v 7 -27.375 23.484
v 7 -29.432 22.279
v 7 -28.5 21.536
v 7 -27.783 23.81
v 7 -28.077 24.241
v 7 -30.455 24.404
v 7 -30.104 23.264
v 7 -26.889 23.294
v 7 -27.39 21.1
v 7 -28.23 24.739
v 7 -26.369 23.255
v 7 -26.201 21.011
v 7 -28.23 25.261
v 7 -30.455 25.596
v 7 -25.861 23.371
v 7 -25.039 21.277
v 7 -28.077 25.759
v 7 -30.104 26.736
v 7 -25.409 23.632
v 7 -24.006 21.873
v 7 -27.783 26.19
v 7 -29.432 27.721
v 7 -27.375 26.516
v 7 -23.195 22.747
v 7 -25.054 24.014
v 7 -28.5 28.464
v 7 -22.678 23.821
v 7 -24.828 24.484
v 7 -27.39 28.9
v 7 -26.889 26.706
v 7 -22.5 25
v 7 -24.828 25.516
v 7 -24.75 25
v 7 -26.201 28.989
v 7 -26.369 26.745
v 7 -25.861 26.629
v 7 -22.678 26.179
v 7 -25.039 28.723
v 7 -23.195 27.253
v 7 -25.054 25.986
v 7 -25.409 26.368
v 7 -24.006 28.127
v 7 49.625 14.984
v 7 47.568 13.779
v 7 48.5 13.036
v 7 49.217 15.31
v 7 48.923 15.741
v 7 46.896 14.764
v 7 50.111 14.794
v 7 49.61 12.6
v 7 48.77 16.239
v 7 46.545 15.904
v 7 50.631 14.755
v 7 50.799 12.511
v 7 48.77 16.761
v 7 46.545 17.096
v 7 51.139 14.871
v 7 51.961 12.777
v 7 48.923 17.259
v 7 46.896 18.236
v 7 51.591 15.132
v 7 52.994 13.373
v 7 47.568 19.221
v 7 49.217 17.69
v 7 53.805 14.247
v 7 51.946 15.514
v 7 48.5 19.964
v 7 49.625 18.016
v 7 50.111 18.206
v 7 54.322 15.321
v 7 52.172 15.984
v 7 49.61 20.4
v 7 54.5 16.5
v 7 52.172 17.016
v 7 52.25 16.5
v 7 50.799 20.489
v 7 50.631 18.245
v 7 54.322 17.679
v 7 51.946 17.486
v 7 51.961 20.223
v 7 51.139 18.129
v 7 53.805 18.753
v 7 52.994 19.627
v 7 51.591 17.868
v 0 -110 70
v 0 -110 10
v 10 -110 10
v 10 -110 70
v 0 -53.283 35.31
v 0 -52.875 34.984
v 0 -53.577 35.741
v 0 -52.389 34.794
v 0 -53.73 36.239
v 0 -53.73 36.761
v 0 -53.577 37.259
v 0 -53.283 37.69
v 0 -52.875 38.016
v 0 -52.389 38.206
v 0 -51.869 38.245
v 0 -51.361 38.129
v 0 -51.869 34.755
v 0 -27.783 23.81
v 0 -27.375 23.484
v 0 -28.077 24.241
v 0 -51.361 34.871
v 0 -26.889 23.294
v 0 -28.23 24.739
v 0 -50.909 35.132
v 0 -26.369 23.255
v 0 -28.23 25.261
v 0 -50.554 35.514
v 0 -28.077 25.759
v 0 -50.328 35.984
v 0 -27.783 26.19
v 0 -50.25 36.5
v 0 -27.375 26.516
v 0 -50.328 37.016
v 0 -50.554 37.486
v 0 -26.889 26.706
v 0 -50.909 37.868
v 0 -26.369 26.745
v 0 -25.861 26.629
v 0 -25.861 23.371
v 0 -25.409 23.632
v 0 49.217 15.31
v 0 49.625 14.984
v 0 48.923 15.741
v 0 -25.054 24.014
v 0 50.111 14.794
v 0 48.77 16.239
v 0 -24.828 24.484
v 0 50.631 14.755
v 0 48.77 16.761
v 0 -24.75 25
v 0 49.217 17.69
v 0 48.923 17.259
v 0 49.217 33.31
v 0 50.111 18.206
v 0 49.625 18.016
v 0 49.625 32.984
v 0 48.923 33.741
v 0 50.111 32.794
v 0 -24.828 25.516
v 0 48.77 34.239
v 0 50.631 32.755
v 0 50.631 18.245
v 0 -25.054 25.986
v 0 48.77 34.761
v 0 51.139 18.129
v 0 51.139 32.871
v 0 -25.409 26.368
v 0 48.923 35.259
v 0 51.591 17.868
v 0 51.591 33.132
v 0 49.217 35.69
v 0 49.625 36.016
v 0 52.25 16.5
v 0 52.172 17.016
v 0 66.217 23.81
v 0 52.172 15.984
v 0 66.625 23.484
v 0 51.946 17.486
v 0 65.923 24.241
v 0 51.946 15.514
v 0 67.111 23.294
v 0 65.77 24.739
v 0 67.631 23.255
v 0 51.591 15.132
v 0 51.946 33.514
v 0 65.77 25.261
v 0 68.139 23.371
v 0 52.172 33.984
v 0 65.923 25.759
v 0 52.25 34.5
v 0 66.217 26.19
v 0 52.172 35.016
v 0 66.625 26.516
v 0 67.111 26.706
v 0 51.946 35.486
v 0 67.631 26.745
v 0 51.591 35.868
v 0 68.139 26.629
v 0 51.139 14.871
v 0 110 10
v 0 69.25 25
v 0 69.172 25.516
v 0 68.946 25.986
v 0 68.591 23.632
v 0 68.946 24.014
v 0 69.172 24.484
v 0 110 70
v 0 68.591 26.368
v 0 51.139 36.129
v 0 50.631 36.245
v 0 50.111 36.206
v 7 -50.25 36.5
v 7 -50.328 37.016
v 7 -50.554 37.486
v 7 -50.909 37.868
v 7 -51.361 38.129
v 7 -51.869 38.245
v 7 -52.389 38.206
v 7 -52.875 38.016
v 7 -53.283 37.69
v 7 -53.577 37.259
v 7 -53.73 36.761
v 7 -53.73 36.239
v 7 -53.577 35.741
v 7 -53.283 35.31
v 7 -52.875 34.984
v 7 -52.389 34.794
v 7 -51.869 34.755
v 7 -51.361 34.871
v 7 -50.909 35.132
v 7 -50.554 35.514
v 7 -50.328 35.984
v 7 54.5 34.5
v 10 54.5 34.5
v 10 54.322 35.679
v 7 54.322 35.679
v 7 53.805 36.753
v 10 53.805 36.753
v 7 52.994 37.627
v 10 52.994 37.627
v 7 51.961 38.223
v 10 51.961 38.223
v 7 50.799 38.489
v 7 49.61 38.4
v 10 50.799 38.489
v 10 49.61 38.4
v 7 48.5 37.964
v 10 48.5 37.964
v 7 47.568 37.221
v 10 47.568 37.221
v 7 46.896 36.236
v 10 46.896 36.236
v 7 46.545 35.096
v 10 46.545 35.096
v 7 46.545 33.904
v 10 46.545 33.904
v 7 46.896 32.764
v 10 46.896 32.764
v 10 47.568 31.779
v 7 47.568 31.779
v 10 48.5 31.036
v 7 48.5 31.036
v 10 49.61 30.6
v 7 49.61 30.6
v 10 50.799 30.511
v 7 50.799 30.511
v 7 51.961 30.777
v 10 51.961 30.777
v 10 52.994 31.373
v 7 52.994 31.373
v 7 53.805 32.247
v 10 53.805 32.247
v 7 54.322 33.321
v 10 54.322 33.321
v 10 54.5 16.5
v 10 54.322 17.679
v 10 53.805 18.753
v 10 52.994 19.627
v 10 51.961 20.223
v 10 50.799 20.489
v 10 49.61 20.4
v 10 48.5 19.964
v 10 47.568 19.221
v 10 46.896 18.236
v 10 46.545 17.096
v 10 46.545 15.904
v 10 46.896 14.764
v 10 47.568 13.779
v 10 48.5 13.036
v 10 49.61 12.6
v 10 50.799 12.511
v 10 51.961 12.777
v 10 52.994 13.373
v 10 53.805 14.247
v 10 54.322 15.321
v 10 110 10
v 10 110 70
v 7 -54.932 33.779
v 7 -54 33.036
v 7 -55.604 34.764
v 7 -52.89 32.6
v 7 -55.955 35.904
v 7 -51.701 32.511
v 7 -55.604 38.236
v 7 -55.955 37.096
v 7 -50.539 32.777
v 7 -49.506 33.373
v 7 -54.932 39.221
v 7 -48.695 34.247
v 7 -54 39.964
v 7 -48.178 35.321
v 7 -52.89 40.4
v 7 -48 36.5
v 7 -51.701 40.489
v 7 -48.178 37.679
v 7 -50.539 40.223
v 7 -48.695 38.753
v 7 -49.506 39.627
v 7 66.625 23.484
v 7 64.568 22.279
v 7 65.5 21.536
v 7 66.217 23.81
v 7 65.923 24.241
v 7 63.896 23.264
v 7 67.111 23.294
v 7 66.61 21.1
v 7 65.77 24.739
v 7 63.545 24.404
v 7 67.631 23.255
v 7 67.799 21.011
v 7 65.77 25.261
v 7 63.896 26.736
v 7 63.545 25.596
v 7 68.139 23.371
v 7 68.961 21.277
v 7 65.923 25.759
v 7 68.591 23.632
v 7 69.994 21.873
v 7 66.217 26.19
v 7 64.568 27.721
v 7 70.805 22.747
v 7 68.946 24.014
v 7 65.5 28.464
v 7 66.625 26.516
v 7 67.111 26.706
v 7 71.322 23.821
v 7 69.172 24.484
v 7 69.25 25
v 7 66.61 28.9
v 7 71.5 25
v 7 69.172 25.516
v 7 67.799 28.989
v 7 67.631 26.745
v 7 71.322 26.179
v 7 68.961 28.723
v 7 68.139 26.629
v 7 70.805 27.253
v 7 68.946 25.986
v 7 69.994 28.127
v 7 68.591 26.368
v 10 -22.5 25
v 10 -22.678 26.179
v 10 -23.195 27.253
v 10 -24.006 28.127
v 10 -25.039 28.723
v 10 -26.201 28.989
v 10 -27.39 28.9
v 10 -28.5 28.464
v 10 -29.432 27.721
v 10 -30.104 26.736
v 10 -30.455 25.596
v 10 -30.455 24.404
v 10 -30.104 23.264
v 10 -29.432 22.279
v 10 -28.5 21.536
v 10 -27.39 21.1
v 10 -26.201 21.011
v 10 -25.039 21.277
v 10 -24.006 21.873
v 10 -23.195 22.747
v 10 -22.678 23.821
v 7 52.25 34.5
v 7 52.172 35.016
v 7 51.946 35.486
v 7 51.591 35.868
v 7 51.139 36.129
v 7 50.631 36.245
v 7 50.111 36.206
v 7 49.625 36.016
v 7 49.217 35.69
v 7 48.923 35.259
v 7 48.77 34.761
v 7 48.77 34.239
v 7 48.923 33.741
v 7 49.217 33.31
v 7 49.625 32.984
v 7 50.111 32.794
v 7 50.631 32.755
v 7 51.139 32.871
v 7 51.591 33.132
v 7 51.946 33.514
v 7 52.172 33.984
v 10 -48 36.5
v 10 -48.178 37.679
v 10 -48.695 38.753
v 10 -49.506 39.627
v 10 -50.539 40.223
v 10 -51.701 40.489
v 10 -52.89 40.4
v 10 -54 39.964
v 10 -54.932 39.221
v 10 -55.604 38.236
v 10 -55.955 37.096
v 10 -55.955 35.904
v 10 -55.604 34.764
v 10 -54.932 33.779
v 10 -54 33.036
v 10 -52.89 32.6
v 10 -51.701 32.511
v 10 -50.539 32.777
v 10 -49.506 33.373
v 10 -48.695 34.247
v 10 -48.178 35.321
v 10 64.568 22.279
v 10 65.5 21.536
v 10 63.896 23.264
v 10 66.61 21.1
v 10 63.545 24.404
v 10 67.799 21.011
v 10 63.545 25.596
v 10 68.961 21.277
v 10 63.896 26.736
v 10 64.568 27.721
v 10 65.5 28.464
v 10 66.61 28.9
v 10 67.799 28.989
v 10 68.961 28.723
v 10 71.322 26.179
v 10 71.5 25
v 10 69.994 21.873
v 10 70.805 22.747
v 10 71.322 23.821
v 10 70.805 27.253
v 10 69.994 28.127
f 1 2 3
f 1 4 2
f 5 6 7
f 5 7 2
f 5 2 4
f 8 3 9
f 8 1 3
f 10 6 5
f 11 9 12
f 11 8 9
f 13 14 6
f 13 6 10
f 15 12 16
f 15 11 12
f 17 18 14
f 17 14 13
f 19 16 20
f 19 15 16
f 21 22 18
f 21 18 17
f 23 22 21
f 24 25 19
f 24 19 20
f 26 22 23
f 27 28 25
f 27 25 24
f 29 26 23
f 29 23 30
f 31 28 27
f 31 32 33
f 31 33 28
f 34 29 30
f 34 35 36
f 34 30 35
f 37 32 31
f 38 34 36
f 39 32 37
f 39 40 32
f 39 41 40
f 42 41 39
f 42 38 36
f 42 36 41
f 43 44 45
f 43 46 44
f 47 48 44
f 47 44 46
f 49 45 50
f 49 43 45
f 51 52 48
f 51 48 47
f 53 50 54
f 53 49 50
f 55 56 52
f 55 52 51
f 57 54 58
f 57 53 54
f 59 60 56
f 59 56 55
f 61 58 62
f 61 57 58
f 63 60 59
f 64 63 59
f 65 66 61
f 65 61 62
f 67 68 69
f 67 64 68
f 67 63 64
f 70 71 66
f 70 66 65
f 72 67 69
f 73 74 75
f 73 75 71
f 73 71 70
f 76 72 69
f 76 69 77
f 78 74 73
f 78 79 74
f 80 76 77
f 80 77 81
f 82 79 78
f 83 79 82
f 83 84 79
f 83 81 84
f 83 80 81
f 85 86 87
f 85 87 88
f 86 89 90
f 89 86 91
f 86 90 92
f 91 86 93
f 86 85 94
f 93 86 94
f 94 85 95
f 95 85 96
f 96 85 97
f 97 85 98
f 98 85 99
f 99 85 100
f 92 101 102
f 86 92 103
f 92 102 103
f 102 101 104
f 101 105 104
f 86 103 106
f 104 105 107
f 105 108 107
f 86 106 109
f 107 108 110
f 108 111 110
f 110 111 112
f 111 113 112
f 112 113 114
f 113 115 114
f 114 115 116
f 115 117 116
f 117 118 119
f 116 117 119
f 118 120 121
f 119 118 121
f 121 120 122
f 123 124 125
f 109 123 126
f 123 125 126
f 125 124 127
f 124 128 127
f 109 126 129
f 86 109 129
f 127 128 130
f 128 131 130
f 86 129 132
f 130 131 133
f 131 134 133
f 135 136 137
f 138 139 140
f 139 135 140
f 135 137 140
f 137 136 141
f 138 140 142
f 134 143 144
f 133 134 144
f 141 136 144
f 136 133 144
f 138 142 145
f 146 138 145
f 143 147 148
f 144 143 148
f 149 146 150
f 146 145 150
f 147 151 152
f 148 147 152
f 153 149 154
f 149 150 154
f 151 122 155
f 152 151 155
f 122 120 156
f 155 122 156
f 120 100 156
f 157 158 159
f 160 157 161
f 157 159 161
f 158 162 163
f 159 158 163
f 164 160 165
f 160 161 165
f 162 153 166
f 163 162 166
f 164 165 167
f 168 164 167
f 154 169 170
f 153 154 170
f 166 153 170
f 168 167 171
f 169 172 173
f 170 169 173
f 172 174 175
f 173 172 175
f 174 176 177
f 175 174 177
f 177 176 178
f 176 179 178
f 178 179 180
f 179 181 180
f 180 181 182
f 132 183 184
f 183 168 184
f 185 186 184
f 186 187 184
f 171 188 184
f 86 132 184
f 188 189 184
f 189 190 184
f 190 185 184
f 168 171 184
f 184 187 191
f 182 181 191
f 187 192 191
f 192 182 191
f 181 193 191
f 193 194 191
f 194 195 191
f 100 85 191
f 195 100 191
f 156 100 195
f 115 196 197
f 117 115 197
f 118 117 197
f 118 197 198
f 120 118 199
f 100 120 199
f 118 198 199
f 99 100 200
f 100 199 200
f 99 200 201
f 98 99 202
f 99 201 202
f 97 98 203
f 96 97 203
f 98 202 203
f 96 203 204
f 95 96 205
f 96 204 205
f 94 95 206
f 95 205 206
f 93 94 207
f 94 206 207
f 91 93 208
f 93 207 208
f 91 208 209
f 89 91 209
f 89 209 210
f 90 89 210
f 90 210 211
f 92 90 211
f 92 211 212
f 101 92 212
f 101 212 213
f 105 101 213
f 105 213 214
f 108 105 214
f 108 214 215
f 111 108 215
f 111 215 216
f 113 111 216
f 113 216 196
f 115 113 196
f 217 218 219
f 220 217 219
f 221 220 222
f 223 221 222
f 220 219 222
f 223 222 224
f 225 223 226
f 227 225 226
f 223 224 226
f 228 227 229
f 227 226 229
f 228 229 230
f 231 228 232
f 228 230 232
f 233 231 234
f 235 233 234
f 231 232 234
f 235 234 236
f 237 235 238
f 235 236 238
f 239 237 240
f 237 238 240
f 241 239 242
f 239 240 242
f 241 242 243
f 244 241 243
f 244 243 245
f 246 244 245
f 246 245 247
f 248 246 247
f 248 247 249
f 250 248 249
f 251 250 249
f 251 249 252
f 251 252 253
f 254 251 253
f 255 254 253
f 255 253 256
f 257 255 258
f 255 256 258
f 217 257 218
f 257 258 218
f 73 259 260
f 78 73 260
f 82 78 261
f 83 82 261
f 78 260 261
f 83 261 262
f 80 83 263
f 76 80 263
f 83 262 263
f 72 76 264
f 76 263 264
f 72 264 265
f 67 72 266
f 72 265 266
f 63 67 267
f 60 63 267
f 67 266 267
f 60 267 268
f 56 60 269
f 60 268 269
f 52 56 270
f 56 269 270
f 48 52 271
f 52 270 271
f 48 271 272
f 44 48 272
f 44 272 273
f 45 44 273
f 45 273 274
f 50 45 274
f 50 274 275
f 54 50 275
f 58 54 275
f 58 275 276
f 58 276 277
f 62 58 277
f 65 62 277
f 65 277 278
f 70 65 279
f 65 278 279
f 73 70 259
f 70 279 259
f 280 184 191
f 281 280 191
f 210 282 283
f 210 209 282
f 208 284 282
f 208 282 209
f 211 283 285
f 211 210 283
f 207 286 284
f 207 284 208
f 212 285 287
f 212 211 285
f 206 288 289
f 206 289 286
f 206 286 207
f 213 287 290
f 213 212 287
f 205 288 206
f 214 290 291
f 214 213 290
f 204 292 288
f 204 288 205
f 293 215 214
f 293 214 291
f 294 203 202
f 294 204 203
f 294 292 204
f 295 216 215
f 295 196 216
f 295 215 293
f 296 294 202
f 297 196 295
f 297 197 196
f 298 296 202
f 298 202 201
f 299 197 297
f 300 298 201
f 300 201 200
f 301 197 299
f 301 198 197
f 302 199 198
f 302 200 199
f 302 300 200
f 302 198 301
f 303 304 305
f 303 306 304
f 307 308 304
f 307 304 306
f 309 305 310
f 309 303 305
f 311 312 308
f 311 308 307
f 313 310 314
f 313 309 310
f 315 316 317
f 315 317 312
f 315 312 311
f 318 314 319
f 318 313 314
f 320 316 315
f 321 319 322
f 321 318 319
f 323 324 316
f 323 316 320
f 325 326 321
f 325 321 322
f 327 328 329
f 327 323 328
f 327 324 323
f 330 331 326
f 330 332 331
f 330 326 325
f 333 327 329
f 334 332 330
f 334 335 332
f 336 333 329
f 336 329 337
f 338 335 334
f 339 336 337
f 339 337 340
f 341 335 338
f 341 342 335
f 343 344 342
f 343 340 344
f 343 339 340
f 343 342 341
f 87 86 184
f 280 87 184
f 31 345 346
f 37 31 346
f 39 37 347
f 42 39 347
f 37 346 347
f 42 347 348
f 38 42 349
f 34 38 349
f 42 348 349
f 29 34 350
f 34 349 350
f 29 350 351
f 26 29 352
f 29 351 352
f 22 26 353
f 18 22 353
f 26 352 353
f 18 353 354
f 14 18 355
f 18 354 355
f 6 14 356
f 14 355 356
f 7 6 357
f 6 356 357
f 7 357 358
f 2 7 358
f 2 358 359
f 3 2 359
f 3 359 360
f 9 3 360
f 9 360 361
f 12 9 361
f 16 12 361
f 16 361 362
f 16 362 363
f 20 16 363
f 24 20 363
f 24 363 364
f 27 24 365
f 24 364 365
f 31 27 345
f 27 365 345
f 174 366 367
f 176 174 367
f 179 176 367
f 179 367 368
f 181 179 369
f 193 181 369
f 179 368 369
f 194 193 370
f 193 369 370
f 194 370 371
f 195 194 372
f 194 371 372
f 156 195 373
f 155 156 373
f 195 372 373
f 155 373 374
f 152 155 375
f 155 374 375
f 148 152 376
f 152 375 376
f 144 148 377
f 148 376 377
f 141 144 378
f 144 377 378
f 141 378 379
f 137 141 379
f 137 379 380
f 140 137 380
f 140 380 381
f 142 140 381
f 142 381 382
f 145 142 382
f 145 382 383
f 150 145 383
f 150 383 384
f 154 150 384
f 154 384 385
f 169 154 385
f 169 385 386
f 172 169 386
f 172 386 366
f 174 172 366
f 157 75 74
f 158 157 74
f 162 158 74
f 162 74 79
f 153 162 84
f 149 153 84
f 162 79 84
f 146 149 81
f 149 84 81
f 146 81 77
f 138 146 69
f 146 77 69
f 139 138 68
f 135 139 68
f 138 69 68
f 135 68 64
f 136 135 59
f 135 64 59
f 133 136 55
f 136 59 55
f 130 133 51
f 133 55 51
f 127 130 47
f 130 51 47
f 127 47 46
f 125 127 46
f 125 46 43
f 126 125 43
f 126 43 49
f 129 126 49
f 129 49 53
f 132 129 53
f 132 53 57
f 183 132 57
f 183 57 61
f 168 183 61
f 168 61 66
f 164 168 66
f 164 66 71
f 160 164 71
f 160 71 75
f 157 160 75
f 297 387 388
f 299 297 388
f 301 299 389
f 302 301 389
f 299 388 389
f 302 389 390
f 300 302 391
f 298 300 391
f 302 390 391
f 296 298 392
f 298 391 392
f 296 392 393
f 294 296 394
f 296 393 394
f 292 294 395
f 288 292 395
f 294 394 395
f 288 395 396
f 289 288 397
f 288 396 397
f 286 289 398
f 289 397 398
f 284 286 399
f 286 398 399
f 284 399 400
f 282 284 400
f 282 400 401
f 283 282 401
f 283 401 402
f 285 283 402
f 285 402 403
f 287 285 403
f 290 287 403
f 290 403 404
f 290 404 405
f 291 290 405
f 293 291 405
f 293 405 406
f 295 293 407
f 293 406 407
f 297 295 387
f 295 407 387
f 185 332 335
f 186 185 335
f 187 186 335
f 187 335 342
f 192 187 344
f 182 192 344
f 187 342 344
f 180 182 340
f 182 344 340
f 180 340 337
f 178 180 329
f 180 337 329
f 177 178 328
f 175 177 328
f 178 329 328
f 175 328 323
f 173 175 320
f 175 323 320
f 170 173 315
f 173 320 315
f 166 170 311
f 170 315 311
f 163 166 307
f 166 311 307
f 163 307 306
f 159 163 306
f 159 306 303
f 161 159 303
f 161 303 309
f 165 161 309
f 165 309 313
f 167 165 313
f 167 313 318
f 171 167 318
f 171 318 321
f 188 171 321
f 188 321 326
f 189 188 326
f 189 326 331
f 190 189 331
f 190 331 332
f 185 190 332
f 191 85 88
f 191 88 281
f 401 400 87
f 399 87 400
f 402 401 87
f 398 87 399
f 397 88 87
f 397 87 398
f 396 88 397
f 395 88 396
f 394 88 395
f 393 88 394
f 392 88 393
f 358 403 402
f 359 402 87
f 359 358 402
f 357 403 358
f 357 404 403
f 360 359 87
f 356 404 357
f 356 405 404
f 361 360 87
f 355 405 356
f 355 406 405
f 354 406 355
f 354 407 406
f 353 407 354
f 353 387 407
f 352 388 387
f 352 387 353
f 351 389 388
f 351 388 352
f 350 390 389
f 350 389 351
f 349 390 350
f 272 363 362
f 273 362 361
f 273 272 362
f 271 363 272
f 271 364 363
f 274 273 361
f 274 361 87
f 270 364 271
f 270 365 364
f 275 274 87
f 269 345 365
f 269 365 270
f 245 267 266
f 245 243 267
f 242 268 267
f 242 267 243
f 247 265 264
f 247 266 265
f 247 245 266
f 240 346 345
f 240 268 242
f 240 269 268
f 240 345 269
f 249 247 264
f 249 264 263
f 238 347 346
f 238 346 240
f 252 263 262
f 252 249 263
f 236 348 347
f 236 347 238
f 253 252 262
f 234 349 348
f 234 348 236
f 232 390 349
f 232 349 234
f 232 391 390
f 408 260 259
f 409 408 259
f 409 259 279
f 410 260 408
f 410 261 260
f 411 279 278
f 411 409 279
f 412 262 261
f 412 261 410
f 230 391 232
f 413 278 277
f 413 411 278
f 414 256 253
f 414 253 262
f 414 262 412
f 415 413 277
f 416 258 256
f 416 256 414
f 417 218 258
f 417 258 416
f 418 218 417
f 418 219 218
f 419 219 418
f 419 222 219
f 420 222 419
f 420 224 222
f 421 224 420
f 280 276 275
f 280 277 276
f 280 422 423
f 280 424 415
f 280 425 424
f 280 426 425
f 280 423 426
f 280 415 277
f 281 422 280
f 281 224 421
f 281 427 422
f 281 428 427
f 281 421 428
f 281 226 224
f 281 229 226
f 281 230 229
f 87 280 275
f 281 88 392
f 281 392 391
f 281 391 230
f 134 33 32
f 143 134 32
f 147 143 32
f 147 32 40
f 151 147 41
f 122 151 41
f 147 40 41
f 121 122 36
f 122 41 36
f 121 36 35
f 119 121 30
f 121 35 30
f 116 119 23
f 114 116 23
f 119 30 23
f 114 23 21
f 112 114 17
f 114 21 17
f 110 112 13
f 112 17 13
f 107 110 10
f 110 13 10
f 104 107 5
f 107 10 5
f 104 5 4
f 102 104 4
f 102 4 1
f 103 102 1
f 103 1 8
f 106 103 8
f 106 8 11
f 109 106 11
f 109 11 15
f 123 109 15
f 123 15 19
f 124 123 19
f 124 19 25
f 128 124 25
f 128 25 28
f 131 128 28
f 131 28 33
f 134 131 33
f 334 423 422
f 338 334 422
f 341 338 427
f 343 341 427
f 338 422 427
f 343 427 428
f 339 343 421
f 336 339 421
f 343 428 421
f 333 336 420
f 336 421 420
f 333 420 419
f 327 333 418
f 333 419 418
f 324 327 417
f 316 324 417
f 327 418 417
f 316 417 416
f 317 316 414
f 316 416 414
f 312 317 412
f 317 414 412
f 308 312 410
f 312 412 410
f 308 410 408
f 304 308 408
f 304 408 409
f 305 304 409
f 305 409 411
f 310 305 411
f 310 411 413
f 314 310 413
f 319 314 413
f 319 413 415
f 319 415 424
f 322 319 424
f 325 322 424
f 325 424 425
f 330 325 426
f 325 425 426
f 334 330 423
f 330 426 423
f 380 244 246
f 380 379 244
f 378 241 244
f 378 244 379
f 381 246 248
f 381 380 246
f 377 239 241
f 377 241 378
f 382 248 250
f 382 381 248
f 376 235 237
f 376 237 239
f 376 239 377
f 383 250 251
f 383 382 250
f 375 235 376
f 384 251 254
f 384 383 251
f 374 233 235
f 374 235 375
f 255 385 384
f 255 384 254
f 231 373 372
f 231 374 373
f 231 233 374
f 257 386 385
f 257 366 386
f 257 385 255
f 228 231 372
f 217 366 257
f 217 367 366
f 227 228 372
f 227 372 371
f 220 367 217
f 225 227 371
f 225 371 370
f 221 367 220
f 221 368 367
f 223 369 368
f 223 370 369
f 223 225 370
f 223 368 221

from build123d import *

# Parameters (mm, degrees)
SKETCH012_W          = 220
SKETCH012_H          = 60
PAD006_DEPTH         = 10
SKETCH017_R          = 1.75
POCKET010_DEPTH      = 10.001
POCKET010_DEPTH_BACK = 0.001
SKETCH018_R          = 4
POCKET011_DEPTH      = 3


with BuildPart() as part:
    # Sketch012 → Pad006 (new body)
    with BuildSketch(Plane.YZ):
        with Locations((0, 40)):
            Rectangle(SKETCH012_W, SKETCH012_H)
    extrude(amount=PAD006_DEPTH)

    # Sketch017 (on Face6 of Pad006) → Pocket010 (cut, two sides)
    with BuildSketch(Plane.YZ.offset(10)) as pocket010_sk:
        with Locations((-52, 36.5)):
            Circle(SKETCH017_R)
        with Locations((-26.5, 25)):
            Circle(SKETCH017_R)
        with Locations((50.5, 34.5)):
            Circle(SKETCH017_R)
        with Locations((50.5, 16.5)):
            Circle(SKETCH017_R)
        with Locations((67.5, 25)):
            Circle(SKETCH017_R)
    extrude(amount=-POCKET010_DEPTH, mode=Mode.SUBTRACT)
    extrude(pocket010_sk.sketch, amount=POCKET010_DEPTH_BACK, mode=Mode.SUBTRACT)

    # Sketch018 (on Face5 of Pocket010) → Pocket011 (cut)
    with BuildSketch(Plane.YZ.offset(10)):
        with Locations((-52, 36.5)):
            Circle(SKETCH018_R)
        with Locations((-26.5, 25)):
            Circle(SKETCH018_R)
        with Locations((50.5, 34.5)):
            Circle(SKETCH018_R)
        with Locations((50.5, 16.5)):
            Circle(SKETCH018_R)
        with Locations((67.5, 25)):
            Circle(SKETCH018_R)
    extrude(amount=-POCKET011_DEPTH, mode=Mode.SUBTRACT)


solid = part.part
